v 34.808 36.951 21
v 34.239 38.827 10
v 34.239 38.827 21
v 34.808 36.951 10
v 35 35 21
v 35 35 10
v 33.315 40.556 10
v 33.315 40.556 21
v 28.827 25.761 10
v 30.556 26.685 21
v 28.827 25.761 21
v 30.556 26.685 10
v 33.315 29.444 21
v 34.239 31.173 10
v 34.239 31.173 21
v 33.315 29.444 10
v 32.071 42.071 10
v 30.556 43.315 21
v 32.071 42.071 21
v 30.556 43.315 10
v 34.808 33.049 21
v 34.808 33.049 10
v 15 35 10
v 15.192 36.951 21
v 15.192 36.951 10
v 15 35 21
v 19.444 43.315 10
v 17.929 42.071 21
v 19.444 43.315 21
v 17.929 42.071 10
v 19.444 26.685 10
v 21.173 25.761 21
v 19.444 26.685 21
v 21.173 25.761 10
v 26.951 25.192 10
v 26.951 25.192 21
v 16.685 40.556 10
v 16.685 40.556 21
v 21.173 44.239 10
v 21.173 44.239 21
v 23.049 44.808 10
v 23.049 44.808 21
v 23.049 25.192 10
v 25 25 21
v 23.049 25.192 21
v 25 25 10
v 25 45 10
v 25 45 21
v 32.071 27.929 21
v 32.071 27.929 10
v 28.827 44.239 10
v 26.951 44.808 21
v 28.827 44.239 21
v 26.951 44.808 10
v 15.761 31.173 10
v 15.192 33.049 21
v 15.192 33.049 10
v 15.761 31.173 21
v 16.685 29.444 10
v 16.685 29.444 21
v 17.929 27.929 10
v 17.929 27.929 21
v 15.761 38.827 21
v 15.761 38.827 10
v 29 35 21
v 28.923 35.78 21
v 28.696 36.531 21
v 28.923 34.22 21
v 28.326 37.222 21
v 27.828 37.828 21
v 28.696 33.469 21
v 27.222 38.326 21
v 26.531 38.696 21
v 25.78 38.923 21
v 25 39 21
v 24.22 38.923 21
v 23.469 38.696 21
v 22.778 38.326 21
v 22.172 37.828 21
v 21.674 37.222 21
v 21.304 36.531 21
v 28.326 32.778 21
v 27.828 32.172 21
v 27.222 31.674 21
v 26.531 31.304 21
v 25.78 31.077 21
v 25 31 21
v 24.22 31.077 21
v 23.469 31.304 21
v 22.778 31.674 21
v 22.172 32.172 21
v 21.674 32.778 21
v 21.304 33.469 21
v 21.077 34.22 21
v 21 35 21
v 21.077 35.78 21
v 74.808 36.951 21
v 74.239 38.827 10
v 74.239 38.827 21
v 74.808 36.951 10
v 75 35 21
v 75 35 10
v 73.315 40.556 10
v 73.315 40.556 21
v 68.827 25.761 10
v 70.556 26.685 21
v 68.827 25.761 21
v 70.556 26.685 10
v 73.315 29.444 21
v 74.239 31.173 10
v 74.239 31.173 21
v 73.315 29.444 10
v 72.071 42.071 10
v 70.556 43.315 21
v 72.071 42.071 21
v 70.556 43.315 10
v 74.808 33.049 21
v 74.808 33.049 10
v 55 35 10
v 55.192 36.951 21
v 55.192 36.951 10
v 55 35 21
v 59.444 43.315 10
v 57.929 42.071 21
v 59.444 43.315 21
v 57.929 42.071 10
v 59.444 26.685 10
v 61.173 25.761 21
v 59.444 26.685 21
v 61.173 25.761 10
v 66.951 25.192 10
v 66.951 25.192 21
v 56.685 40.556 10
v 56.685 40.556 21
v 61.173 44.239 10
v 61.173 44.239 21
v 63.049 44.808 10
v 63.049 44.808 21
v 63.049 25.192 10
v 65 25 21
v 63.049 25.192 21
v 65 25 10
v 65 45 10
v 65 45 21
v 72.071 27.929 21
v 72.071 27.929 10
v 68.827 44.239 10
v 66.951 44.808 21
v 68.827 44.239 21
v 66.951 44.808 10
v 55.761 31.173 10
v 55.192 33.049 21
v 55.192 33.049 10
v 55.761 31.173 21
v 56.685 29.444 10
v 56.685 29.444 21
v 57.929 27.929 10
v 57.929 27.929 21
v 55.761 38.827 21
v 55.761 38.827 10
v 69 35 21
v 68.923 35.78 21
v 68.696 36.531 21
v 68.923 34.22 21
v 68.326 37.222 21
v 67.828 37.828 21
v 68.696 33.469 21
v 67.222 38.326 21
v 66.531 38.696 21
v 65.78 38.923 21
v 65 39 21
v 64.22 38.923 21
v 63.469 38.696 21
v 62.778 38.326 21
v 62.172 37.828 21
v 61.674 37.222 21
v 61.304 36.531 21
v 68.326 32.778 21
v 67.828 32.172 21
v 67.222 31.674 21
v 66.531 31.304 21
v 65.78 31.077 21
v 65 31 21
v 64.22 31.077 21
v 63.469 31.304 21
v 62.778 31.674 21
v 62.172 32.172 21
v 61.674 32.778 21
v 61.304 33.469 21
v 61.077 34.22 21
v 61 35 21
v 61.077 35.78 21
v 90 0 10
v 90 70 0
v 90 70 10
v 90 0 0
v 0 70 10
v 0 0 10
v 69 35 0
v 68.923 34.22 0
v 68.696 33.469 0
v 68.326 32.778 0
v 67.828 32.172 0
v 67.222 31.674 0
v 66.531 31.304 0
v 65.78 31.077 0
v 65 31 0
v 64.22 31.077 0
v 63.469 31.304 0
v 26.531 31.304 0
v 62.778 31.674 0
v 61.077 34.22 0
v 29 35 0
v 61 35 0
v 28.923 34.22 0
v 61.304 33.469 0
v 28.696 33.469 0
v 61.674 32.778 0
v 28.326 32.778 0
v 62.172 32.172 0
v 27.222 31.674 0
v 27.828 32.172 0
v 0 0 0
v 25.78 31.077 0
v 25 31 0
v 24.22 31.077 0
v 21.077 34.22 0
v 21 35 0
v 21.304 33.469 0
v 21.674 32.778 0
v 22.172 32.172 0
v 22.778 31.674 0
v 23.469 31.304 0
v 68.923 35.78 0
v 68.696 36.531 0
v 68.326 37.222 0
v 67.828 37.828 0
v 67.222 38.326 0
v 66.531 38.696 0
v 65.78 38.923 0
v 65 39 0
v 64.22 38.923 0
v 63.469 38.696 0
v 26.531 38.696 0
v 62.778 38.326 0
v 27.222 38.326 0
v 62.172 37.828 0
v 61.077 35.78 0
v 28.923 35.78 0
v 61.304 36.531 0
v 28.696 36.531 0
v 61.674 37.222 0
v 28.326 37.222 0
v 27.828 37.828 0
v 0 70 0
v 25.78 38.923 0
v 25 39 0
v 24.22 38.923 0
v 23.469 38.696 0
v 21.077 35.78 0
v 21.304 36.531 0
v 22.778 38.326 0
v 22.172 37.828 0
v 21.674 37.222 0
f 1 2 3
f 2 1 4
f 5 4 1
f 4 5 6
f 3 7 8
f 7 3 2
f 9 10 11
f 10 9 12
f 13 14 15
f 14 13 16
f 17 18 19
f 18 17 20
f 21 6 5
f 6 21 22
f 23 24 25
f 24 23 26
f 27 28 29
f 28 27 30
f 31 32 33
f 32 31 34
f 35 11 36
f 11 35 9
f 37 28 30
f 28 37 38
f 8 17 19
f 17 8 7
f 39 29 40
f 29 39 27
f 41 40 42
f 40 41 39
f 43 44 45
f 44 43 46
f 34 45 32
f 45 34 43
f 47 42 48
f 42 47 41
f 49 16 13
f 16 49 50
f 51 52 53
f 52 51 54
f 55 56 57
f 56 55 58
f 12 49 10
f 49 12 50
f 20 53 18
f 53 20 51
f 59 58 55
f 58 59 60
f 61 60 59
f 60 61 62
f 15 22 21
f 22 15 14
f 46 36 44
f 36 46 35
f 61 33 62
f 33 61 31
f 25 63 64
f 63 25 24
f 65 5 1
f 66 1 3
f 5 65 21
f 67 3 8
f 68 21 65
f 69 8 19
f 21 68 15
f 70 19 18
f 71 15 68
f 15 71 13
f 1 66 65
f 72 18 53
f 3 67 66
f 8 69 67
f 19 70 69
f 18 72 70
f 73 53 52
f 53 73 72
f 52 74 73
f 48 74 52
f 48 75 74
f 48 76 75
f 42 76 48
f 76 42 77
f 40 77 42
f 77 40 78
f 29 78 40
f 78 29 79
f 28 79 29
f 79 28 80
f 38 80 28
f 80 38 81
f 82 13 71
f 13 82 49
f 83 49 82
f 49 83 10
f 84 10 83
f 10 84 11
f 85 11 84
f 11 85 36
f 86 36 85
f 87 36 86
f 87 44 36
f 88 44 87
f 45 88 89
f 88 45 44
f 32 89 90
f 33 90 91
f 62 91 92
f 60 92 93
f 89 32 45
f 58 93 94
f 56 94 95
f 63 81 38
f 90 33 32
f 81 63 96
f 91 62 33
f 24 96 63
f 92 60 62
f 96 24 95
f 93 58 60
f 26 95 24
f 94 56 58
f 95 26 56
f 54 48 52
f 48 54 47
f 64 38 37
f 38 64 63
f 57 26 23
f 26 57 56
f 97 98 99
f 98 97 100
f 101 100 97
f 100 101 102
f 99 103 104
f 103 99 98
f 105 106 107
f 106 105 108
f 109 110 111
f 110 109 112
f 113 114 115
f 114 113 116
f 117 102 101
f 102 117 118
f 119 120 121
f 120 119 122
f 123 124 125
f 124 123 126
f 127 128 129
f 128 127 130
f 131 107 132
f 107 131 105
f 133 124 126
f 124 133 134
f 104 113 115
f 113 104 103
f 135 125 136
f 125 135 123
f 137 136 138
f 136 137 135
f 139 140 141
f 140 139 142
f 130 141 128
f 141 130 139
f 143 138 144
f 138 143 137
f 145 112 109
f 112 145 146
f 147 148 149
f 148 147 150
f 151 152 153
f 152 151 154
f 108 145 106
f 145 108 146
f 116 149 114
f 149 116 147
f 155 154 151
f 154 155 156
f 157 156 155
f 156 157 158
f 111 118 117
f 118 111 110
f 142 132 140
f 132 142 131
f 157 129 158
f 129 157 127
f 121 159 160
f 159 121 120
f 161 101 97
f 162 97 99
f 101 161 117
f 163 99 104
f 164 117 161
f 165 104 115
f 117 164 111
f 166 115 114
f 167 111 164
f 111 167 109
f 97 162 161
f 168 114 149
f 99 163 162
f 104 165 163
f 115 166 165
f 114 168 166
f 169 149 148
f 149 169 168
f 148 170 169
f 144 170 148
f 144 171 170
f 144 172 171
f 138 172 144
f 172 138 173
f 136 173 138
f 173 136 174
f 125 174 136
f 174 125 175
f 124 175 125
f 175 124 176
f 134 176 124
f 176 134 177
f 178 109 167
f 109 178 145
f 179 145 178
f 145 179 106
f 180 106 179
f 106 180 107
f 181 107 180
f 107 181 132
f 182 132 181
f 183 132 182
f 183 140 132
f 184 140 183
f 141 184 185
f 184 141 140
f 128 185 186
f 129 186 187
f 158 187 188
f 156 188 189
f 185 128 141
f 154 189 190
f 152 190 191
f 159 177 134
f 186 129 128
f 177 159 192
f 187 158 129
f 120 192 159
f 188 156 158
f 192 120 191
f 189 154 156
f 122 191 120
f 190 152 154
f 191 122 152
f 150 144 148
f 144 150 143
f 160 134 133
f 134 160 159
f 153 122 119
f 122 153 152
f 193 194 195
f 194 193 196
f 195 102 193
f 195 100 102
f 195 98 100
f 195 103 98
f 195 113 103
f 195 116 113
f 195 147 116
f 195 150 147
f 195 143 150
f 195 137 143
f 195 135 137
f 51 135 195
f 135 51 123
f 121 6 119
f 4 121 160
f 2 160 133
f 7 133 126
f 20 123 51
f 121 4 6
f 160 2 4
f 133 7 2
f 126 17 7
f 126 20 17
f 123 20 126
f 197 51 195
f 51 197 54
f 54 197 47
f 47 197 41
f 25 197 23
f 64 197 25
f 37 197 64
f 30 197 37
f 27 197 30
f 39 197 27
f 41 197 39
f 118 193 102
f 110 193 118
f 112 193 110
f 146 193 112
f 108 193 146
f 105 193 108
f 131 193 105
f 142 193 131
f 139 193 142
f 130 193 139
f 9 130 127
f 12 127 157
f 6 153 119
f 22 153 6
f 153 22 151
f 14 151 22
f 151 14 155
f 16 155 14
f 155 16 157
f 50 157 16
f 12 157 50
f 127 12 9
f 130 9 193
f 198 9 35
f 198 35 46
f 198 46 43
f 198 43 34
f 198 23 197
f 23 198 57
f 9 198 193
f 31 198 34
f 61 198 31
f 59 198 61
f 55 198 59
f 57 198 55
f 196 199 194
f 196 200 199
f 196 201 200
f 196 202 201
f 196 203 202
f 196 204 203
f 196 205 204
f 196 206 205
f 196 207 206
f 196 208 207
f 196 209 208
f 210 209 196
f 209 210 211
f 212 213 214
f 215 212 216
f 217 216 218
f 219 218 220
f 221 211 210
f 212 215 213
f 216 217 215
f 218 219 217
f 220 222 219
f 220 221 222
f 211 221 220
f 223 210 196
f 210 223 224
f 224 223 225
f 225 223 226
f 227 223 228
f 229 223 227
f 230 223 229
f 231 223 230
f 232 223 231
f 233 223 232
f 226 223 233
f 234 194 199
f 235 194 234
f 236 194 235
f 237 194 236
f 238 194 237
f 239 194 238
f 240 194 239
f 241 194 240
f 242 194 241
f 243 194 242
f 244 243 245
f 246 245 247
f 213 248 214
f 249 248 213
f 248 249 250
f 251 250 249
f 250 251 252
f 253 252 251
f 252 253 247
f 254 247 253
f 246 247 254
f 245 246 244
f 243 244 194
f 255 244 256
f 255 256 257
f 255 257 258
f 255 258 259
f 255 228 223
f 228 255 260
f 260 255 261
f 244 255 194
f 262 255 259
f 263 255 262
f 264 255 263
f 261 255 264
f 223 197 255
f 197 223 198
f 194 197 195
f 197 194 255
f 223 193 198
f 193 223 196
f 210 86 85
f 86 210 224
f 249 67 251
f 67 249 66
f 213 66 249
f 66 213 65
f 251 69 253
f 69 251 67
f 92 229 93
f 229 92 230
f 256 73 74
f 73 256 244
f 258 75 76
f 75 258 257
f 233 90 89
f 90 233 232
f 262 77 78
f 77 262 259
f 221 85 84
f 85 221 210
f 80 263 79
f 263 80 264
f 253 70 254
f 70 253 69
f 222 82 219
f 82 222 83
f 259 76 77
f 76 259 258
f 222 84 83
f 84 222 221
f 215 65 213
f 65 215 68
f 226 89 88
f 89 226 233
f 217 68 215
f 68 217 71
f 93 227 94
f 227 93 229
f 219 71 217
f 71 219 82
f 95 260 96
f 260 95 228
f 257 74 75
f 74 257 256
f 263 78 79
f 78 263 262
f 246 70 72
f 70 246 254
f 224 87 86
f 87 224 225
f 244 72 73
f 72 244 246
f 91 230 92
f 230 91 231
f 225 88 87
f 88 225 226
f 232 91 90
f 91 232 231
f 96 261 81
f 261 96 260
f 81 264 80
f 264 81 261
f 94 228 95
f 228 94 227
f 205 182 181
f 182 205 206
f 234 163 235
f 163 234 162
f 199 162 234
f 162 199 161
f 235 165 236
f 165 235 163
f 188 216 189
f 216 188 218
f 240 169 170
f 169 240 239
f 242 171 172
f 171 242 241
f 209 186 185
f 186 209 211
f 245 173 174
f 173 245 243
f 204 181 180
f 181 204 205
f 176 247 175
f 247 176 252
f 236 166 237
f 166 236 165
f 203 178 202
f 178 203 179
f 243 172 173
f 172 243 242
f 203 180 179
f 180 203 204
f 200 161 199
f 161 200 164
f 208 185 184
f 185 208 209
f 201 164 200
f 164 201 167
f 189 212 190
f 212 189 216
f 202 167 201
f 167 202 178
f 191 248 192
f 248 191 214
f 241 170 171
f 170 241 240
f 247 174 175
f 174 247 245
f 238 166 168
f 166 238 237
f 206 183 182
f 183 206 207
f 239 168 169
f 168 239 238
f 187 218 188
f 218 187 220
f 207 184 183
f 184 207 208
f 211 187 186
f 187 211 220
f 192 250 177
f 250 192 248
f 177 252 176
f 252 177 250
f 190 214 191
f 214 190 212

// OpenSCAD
$fn = 32;

// ----------------------------------------------------------------------
// Drill jig: two_boss jig
// ----------------------------------------------------------------------

// --- parameters (mm) ---
plate_l = 90;             // plate length, X
plate_w = 70;             // plate width, Y
plate_t = 10;             // plate thickness
boss_d = 20;              // guide boss diameter
boss_h = 12;              // boss height above the plate
guide_d = 8;              // guide hole diameter
boss_pitch = 40;          // boss pitch

n_boss = 2;  // guide bosses
boss_x0 = (plate_l - (n_boss - 1) * boss_pitch) / 2;  // first boss X
boss_top = plate_t - 1 + boss_h;  // boss crown height
total_h = boss_top;  // overall height

difference() {
  union() {
  cube([plate_l, plate_w, plate_t]);
  for (i = [0 : n_boss - 1])
    translate([boss_x0 + i * boss_pitch, plate_w / 2, plate_t - 1])
      cylinder(h = boss_h, d = boss_d);
  }
  for (i = [0 : n_boss - 1])
    translate([boss_x0 + i * boss_pitch, plate_w / 2, -1])
      cylinder(h = plate_t + boss_h, d = guide_d);
}
